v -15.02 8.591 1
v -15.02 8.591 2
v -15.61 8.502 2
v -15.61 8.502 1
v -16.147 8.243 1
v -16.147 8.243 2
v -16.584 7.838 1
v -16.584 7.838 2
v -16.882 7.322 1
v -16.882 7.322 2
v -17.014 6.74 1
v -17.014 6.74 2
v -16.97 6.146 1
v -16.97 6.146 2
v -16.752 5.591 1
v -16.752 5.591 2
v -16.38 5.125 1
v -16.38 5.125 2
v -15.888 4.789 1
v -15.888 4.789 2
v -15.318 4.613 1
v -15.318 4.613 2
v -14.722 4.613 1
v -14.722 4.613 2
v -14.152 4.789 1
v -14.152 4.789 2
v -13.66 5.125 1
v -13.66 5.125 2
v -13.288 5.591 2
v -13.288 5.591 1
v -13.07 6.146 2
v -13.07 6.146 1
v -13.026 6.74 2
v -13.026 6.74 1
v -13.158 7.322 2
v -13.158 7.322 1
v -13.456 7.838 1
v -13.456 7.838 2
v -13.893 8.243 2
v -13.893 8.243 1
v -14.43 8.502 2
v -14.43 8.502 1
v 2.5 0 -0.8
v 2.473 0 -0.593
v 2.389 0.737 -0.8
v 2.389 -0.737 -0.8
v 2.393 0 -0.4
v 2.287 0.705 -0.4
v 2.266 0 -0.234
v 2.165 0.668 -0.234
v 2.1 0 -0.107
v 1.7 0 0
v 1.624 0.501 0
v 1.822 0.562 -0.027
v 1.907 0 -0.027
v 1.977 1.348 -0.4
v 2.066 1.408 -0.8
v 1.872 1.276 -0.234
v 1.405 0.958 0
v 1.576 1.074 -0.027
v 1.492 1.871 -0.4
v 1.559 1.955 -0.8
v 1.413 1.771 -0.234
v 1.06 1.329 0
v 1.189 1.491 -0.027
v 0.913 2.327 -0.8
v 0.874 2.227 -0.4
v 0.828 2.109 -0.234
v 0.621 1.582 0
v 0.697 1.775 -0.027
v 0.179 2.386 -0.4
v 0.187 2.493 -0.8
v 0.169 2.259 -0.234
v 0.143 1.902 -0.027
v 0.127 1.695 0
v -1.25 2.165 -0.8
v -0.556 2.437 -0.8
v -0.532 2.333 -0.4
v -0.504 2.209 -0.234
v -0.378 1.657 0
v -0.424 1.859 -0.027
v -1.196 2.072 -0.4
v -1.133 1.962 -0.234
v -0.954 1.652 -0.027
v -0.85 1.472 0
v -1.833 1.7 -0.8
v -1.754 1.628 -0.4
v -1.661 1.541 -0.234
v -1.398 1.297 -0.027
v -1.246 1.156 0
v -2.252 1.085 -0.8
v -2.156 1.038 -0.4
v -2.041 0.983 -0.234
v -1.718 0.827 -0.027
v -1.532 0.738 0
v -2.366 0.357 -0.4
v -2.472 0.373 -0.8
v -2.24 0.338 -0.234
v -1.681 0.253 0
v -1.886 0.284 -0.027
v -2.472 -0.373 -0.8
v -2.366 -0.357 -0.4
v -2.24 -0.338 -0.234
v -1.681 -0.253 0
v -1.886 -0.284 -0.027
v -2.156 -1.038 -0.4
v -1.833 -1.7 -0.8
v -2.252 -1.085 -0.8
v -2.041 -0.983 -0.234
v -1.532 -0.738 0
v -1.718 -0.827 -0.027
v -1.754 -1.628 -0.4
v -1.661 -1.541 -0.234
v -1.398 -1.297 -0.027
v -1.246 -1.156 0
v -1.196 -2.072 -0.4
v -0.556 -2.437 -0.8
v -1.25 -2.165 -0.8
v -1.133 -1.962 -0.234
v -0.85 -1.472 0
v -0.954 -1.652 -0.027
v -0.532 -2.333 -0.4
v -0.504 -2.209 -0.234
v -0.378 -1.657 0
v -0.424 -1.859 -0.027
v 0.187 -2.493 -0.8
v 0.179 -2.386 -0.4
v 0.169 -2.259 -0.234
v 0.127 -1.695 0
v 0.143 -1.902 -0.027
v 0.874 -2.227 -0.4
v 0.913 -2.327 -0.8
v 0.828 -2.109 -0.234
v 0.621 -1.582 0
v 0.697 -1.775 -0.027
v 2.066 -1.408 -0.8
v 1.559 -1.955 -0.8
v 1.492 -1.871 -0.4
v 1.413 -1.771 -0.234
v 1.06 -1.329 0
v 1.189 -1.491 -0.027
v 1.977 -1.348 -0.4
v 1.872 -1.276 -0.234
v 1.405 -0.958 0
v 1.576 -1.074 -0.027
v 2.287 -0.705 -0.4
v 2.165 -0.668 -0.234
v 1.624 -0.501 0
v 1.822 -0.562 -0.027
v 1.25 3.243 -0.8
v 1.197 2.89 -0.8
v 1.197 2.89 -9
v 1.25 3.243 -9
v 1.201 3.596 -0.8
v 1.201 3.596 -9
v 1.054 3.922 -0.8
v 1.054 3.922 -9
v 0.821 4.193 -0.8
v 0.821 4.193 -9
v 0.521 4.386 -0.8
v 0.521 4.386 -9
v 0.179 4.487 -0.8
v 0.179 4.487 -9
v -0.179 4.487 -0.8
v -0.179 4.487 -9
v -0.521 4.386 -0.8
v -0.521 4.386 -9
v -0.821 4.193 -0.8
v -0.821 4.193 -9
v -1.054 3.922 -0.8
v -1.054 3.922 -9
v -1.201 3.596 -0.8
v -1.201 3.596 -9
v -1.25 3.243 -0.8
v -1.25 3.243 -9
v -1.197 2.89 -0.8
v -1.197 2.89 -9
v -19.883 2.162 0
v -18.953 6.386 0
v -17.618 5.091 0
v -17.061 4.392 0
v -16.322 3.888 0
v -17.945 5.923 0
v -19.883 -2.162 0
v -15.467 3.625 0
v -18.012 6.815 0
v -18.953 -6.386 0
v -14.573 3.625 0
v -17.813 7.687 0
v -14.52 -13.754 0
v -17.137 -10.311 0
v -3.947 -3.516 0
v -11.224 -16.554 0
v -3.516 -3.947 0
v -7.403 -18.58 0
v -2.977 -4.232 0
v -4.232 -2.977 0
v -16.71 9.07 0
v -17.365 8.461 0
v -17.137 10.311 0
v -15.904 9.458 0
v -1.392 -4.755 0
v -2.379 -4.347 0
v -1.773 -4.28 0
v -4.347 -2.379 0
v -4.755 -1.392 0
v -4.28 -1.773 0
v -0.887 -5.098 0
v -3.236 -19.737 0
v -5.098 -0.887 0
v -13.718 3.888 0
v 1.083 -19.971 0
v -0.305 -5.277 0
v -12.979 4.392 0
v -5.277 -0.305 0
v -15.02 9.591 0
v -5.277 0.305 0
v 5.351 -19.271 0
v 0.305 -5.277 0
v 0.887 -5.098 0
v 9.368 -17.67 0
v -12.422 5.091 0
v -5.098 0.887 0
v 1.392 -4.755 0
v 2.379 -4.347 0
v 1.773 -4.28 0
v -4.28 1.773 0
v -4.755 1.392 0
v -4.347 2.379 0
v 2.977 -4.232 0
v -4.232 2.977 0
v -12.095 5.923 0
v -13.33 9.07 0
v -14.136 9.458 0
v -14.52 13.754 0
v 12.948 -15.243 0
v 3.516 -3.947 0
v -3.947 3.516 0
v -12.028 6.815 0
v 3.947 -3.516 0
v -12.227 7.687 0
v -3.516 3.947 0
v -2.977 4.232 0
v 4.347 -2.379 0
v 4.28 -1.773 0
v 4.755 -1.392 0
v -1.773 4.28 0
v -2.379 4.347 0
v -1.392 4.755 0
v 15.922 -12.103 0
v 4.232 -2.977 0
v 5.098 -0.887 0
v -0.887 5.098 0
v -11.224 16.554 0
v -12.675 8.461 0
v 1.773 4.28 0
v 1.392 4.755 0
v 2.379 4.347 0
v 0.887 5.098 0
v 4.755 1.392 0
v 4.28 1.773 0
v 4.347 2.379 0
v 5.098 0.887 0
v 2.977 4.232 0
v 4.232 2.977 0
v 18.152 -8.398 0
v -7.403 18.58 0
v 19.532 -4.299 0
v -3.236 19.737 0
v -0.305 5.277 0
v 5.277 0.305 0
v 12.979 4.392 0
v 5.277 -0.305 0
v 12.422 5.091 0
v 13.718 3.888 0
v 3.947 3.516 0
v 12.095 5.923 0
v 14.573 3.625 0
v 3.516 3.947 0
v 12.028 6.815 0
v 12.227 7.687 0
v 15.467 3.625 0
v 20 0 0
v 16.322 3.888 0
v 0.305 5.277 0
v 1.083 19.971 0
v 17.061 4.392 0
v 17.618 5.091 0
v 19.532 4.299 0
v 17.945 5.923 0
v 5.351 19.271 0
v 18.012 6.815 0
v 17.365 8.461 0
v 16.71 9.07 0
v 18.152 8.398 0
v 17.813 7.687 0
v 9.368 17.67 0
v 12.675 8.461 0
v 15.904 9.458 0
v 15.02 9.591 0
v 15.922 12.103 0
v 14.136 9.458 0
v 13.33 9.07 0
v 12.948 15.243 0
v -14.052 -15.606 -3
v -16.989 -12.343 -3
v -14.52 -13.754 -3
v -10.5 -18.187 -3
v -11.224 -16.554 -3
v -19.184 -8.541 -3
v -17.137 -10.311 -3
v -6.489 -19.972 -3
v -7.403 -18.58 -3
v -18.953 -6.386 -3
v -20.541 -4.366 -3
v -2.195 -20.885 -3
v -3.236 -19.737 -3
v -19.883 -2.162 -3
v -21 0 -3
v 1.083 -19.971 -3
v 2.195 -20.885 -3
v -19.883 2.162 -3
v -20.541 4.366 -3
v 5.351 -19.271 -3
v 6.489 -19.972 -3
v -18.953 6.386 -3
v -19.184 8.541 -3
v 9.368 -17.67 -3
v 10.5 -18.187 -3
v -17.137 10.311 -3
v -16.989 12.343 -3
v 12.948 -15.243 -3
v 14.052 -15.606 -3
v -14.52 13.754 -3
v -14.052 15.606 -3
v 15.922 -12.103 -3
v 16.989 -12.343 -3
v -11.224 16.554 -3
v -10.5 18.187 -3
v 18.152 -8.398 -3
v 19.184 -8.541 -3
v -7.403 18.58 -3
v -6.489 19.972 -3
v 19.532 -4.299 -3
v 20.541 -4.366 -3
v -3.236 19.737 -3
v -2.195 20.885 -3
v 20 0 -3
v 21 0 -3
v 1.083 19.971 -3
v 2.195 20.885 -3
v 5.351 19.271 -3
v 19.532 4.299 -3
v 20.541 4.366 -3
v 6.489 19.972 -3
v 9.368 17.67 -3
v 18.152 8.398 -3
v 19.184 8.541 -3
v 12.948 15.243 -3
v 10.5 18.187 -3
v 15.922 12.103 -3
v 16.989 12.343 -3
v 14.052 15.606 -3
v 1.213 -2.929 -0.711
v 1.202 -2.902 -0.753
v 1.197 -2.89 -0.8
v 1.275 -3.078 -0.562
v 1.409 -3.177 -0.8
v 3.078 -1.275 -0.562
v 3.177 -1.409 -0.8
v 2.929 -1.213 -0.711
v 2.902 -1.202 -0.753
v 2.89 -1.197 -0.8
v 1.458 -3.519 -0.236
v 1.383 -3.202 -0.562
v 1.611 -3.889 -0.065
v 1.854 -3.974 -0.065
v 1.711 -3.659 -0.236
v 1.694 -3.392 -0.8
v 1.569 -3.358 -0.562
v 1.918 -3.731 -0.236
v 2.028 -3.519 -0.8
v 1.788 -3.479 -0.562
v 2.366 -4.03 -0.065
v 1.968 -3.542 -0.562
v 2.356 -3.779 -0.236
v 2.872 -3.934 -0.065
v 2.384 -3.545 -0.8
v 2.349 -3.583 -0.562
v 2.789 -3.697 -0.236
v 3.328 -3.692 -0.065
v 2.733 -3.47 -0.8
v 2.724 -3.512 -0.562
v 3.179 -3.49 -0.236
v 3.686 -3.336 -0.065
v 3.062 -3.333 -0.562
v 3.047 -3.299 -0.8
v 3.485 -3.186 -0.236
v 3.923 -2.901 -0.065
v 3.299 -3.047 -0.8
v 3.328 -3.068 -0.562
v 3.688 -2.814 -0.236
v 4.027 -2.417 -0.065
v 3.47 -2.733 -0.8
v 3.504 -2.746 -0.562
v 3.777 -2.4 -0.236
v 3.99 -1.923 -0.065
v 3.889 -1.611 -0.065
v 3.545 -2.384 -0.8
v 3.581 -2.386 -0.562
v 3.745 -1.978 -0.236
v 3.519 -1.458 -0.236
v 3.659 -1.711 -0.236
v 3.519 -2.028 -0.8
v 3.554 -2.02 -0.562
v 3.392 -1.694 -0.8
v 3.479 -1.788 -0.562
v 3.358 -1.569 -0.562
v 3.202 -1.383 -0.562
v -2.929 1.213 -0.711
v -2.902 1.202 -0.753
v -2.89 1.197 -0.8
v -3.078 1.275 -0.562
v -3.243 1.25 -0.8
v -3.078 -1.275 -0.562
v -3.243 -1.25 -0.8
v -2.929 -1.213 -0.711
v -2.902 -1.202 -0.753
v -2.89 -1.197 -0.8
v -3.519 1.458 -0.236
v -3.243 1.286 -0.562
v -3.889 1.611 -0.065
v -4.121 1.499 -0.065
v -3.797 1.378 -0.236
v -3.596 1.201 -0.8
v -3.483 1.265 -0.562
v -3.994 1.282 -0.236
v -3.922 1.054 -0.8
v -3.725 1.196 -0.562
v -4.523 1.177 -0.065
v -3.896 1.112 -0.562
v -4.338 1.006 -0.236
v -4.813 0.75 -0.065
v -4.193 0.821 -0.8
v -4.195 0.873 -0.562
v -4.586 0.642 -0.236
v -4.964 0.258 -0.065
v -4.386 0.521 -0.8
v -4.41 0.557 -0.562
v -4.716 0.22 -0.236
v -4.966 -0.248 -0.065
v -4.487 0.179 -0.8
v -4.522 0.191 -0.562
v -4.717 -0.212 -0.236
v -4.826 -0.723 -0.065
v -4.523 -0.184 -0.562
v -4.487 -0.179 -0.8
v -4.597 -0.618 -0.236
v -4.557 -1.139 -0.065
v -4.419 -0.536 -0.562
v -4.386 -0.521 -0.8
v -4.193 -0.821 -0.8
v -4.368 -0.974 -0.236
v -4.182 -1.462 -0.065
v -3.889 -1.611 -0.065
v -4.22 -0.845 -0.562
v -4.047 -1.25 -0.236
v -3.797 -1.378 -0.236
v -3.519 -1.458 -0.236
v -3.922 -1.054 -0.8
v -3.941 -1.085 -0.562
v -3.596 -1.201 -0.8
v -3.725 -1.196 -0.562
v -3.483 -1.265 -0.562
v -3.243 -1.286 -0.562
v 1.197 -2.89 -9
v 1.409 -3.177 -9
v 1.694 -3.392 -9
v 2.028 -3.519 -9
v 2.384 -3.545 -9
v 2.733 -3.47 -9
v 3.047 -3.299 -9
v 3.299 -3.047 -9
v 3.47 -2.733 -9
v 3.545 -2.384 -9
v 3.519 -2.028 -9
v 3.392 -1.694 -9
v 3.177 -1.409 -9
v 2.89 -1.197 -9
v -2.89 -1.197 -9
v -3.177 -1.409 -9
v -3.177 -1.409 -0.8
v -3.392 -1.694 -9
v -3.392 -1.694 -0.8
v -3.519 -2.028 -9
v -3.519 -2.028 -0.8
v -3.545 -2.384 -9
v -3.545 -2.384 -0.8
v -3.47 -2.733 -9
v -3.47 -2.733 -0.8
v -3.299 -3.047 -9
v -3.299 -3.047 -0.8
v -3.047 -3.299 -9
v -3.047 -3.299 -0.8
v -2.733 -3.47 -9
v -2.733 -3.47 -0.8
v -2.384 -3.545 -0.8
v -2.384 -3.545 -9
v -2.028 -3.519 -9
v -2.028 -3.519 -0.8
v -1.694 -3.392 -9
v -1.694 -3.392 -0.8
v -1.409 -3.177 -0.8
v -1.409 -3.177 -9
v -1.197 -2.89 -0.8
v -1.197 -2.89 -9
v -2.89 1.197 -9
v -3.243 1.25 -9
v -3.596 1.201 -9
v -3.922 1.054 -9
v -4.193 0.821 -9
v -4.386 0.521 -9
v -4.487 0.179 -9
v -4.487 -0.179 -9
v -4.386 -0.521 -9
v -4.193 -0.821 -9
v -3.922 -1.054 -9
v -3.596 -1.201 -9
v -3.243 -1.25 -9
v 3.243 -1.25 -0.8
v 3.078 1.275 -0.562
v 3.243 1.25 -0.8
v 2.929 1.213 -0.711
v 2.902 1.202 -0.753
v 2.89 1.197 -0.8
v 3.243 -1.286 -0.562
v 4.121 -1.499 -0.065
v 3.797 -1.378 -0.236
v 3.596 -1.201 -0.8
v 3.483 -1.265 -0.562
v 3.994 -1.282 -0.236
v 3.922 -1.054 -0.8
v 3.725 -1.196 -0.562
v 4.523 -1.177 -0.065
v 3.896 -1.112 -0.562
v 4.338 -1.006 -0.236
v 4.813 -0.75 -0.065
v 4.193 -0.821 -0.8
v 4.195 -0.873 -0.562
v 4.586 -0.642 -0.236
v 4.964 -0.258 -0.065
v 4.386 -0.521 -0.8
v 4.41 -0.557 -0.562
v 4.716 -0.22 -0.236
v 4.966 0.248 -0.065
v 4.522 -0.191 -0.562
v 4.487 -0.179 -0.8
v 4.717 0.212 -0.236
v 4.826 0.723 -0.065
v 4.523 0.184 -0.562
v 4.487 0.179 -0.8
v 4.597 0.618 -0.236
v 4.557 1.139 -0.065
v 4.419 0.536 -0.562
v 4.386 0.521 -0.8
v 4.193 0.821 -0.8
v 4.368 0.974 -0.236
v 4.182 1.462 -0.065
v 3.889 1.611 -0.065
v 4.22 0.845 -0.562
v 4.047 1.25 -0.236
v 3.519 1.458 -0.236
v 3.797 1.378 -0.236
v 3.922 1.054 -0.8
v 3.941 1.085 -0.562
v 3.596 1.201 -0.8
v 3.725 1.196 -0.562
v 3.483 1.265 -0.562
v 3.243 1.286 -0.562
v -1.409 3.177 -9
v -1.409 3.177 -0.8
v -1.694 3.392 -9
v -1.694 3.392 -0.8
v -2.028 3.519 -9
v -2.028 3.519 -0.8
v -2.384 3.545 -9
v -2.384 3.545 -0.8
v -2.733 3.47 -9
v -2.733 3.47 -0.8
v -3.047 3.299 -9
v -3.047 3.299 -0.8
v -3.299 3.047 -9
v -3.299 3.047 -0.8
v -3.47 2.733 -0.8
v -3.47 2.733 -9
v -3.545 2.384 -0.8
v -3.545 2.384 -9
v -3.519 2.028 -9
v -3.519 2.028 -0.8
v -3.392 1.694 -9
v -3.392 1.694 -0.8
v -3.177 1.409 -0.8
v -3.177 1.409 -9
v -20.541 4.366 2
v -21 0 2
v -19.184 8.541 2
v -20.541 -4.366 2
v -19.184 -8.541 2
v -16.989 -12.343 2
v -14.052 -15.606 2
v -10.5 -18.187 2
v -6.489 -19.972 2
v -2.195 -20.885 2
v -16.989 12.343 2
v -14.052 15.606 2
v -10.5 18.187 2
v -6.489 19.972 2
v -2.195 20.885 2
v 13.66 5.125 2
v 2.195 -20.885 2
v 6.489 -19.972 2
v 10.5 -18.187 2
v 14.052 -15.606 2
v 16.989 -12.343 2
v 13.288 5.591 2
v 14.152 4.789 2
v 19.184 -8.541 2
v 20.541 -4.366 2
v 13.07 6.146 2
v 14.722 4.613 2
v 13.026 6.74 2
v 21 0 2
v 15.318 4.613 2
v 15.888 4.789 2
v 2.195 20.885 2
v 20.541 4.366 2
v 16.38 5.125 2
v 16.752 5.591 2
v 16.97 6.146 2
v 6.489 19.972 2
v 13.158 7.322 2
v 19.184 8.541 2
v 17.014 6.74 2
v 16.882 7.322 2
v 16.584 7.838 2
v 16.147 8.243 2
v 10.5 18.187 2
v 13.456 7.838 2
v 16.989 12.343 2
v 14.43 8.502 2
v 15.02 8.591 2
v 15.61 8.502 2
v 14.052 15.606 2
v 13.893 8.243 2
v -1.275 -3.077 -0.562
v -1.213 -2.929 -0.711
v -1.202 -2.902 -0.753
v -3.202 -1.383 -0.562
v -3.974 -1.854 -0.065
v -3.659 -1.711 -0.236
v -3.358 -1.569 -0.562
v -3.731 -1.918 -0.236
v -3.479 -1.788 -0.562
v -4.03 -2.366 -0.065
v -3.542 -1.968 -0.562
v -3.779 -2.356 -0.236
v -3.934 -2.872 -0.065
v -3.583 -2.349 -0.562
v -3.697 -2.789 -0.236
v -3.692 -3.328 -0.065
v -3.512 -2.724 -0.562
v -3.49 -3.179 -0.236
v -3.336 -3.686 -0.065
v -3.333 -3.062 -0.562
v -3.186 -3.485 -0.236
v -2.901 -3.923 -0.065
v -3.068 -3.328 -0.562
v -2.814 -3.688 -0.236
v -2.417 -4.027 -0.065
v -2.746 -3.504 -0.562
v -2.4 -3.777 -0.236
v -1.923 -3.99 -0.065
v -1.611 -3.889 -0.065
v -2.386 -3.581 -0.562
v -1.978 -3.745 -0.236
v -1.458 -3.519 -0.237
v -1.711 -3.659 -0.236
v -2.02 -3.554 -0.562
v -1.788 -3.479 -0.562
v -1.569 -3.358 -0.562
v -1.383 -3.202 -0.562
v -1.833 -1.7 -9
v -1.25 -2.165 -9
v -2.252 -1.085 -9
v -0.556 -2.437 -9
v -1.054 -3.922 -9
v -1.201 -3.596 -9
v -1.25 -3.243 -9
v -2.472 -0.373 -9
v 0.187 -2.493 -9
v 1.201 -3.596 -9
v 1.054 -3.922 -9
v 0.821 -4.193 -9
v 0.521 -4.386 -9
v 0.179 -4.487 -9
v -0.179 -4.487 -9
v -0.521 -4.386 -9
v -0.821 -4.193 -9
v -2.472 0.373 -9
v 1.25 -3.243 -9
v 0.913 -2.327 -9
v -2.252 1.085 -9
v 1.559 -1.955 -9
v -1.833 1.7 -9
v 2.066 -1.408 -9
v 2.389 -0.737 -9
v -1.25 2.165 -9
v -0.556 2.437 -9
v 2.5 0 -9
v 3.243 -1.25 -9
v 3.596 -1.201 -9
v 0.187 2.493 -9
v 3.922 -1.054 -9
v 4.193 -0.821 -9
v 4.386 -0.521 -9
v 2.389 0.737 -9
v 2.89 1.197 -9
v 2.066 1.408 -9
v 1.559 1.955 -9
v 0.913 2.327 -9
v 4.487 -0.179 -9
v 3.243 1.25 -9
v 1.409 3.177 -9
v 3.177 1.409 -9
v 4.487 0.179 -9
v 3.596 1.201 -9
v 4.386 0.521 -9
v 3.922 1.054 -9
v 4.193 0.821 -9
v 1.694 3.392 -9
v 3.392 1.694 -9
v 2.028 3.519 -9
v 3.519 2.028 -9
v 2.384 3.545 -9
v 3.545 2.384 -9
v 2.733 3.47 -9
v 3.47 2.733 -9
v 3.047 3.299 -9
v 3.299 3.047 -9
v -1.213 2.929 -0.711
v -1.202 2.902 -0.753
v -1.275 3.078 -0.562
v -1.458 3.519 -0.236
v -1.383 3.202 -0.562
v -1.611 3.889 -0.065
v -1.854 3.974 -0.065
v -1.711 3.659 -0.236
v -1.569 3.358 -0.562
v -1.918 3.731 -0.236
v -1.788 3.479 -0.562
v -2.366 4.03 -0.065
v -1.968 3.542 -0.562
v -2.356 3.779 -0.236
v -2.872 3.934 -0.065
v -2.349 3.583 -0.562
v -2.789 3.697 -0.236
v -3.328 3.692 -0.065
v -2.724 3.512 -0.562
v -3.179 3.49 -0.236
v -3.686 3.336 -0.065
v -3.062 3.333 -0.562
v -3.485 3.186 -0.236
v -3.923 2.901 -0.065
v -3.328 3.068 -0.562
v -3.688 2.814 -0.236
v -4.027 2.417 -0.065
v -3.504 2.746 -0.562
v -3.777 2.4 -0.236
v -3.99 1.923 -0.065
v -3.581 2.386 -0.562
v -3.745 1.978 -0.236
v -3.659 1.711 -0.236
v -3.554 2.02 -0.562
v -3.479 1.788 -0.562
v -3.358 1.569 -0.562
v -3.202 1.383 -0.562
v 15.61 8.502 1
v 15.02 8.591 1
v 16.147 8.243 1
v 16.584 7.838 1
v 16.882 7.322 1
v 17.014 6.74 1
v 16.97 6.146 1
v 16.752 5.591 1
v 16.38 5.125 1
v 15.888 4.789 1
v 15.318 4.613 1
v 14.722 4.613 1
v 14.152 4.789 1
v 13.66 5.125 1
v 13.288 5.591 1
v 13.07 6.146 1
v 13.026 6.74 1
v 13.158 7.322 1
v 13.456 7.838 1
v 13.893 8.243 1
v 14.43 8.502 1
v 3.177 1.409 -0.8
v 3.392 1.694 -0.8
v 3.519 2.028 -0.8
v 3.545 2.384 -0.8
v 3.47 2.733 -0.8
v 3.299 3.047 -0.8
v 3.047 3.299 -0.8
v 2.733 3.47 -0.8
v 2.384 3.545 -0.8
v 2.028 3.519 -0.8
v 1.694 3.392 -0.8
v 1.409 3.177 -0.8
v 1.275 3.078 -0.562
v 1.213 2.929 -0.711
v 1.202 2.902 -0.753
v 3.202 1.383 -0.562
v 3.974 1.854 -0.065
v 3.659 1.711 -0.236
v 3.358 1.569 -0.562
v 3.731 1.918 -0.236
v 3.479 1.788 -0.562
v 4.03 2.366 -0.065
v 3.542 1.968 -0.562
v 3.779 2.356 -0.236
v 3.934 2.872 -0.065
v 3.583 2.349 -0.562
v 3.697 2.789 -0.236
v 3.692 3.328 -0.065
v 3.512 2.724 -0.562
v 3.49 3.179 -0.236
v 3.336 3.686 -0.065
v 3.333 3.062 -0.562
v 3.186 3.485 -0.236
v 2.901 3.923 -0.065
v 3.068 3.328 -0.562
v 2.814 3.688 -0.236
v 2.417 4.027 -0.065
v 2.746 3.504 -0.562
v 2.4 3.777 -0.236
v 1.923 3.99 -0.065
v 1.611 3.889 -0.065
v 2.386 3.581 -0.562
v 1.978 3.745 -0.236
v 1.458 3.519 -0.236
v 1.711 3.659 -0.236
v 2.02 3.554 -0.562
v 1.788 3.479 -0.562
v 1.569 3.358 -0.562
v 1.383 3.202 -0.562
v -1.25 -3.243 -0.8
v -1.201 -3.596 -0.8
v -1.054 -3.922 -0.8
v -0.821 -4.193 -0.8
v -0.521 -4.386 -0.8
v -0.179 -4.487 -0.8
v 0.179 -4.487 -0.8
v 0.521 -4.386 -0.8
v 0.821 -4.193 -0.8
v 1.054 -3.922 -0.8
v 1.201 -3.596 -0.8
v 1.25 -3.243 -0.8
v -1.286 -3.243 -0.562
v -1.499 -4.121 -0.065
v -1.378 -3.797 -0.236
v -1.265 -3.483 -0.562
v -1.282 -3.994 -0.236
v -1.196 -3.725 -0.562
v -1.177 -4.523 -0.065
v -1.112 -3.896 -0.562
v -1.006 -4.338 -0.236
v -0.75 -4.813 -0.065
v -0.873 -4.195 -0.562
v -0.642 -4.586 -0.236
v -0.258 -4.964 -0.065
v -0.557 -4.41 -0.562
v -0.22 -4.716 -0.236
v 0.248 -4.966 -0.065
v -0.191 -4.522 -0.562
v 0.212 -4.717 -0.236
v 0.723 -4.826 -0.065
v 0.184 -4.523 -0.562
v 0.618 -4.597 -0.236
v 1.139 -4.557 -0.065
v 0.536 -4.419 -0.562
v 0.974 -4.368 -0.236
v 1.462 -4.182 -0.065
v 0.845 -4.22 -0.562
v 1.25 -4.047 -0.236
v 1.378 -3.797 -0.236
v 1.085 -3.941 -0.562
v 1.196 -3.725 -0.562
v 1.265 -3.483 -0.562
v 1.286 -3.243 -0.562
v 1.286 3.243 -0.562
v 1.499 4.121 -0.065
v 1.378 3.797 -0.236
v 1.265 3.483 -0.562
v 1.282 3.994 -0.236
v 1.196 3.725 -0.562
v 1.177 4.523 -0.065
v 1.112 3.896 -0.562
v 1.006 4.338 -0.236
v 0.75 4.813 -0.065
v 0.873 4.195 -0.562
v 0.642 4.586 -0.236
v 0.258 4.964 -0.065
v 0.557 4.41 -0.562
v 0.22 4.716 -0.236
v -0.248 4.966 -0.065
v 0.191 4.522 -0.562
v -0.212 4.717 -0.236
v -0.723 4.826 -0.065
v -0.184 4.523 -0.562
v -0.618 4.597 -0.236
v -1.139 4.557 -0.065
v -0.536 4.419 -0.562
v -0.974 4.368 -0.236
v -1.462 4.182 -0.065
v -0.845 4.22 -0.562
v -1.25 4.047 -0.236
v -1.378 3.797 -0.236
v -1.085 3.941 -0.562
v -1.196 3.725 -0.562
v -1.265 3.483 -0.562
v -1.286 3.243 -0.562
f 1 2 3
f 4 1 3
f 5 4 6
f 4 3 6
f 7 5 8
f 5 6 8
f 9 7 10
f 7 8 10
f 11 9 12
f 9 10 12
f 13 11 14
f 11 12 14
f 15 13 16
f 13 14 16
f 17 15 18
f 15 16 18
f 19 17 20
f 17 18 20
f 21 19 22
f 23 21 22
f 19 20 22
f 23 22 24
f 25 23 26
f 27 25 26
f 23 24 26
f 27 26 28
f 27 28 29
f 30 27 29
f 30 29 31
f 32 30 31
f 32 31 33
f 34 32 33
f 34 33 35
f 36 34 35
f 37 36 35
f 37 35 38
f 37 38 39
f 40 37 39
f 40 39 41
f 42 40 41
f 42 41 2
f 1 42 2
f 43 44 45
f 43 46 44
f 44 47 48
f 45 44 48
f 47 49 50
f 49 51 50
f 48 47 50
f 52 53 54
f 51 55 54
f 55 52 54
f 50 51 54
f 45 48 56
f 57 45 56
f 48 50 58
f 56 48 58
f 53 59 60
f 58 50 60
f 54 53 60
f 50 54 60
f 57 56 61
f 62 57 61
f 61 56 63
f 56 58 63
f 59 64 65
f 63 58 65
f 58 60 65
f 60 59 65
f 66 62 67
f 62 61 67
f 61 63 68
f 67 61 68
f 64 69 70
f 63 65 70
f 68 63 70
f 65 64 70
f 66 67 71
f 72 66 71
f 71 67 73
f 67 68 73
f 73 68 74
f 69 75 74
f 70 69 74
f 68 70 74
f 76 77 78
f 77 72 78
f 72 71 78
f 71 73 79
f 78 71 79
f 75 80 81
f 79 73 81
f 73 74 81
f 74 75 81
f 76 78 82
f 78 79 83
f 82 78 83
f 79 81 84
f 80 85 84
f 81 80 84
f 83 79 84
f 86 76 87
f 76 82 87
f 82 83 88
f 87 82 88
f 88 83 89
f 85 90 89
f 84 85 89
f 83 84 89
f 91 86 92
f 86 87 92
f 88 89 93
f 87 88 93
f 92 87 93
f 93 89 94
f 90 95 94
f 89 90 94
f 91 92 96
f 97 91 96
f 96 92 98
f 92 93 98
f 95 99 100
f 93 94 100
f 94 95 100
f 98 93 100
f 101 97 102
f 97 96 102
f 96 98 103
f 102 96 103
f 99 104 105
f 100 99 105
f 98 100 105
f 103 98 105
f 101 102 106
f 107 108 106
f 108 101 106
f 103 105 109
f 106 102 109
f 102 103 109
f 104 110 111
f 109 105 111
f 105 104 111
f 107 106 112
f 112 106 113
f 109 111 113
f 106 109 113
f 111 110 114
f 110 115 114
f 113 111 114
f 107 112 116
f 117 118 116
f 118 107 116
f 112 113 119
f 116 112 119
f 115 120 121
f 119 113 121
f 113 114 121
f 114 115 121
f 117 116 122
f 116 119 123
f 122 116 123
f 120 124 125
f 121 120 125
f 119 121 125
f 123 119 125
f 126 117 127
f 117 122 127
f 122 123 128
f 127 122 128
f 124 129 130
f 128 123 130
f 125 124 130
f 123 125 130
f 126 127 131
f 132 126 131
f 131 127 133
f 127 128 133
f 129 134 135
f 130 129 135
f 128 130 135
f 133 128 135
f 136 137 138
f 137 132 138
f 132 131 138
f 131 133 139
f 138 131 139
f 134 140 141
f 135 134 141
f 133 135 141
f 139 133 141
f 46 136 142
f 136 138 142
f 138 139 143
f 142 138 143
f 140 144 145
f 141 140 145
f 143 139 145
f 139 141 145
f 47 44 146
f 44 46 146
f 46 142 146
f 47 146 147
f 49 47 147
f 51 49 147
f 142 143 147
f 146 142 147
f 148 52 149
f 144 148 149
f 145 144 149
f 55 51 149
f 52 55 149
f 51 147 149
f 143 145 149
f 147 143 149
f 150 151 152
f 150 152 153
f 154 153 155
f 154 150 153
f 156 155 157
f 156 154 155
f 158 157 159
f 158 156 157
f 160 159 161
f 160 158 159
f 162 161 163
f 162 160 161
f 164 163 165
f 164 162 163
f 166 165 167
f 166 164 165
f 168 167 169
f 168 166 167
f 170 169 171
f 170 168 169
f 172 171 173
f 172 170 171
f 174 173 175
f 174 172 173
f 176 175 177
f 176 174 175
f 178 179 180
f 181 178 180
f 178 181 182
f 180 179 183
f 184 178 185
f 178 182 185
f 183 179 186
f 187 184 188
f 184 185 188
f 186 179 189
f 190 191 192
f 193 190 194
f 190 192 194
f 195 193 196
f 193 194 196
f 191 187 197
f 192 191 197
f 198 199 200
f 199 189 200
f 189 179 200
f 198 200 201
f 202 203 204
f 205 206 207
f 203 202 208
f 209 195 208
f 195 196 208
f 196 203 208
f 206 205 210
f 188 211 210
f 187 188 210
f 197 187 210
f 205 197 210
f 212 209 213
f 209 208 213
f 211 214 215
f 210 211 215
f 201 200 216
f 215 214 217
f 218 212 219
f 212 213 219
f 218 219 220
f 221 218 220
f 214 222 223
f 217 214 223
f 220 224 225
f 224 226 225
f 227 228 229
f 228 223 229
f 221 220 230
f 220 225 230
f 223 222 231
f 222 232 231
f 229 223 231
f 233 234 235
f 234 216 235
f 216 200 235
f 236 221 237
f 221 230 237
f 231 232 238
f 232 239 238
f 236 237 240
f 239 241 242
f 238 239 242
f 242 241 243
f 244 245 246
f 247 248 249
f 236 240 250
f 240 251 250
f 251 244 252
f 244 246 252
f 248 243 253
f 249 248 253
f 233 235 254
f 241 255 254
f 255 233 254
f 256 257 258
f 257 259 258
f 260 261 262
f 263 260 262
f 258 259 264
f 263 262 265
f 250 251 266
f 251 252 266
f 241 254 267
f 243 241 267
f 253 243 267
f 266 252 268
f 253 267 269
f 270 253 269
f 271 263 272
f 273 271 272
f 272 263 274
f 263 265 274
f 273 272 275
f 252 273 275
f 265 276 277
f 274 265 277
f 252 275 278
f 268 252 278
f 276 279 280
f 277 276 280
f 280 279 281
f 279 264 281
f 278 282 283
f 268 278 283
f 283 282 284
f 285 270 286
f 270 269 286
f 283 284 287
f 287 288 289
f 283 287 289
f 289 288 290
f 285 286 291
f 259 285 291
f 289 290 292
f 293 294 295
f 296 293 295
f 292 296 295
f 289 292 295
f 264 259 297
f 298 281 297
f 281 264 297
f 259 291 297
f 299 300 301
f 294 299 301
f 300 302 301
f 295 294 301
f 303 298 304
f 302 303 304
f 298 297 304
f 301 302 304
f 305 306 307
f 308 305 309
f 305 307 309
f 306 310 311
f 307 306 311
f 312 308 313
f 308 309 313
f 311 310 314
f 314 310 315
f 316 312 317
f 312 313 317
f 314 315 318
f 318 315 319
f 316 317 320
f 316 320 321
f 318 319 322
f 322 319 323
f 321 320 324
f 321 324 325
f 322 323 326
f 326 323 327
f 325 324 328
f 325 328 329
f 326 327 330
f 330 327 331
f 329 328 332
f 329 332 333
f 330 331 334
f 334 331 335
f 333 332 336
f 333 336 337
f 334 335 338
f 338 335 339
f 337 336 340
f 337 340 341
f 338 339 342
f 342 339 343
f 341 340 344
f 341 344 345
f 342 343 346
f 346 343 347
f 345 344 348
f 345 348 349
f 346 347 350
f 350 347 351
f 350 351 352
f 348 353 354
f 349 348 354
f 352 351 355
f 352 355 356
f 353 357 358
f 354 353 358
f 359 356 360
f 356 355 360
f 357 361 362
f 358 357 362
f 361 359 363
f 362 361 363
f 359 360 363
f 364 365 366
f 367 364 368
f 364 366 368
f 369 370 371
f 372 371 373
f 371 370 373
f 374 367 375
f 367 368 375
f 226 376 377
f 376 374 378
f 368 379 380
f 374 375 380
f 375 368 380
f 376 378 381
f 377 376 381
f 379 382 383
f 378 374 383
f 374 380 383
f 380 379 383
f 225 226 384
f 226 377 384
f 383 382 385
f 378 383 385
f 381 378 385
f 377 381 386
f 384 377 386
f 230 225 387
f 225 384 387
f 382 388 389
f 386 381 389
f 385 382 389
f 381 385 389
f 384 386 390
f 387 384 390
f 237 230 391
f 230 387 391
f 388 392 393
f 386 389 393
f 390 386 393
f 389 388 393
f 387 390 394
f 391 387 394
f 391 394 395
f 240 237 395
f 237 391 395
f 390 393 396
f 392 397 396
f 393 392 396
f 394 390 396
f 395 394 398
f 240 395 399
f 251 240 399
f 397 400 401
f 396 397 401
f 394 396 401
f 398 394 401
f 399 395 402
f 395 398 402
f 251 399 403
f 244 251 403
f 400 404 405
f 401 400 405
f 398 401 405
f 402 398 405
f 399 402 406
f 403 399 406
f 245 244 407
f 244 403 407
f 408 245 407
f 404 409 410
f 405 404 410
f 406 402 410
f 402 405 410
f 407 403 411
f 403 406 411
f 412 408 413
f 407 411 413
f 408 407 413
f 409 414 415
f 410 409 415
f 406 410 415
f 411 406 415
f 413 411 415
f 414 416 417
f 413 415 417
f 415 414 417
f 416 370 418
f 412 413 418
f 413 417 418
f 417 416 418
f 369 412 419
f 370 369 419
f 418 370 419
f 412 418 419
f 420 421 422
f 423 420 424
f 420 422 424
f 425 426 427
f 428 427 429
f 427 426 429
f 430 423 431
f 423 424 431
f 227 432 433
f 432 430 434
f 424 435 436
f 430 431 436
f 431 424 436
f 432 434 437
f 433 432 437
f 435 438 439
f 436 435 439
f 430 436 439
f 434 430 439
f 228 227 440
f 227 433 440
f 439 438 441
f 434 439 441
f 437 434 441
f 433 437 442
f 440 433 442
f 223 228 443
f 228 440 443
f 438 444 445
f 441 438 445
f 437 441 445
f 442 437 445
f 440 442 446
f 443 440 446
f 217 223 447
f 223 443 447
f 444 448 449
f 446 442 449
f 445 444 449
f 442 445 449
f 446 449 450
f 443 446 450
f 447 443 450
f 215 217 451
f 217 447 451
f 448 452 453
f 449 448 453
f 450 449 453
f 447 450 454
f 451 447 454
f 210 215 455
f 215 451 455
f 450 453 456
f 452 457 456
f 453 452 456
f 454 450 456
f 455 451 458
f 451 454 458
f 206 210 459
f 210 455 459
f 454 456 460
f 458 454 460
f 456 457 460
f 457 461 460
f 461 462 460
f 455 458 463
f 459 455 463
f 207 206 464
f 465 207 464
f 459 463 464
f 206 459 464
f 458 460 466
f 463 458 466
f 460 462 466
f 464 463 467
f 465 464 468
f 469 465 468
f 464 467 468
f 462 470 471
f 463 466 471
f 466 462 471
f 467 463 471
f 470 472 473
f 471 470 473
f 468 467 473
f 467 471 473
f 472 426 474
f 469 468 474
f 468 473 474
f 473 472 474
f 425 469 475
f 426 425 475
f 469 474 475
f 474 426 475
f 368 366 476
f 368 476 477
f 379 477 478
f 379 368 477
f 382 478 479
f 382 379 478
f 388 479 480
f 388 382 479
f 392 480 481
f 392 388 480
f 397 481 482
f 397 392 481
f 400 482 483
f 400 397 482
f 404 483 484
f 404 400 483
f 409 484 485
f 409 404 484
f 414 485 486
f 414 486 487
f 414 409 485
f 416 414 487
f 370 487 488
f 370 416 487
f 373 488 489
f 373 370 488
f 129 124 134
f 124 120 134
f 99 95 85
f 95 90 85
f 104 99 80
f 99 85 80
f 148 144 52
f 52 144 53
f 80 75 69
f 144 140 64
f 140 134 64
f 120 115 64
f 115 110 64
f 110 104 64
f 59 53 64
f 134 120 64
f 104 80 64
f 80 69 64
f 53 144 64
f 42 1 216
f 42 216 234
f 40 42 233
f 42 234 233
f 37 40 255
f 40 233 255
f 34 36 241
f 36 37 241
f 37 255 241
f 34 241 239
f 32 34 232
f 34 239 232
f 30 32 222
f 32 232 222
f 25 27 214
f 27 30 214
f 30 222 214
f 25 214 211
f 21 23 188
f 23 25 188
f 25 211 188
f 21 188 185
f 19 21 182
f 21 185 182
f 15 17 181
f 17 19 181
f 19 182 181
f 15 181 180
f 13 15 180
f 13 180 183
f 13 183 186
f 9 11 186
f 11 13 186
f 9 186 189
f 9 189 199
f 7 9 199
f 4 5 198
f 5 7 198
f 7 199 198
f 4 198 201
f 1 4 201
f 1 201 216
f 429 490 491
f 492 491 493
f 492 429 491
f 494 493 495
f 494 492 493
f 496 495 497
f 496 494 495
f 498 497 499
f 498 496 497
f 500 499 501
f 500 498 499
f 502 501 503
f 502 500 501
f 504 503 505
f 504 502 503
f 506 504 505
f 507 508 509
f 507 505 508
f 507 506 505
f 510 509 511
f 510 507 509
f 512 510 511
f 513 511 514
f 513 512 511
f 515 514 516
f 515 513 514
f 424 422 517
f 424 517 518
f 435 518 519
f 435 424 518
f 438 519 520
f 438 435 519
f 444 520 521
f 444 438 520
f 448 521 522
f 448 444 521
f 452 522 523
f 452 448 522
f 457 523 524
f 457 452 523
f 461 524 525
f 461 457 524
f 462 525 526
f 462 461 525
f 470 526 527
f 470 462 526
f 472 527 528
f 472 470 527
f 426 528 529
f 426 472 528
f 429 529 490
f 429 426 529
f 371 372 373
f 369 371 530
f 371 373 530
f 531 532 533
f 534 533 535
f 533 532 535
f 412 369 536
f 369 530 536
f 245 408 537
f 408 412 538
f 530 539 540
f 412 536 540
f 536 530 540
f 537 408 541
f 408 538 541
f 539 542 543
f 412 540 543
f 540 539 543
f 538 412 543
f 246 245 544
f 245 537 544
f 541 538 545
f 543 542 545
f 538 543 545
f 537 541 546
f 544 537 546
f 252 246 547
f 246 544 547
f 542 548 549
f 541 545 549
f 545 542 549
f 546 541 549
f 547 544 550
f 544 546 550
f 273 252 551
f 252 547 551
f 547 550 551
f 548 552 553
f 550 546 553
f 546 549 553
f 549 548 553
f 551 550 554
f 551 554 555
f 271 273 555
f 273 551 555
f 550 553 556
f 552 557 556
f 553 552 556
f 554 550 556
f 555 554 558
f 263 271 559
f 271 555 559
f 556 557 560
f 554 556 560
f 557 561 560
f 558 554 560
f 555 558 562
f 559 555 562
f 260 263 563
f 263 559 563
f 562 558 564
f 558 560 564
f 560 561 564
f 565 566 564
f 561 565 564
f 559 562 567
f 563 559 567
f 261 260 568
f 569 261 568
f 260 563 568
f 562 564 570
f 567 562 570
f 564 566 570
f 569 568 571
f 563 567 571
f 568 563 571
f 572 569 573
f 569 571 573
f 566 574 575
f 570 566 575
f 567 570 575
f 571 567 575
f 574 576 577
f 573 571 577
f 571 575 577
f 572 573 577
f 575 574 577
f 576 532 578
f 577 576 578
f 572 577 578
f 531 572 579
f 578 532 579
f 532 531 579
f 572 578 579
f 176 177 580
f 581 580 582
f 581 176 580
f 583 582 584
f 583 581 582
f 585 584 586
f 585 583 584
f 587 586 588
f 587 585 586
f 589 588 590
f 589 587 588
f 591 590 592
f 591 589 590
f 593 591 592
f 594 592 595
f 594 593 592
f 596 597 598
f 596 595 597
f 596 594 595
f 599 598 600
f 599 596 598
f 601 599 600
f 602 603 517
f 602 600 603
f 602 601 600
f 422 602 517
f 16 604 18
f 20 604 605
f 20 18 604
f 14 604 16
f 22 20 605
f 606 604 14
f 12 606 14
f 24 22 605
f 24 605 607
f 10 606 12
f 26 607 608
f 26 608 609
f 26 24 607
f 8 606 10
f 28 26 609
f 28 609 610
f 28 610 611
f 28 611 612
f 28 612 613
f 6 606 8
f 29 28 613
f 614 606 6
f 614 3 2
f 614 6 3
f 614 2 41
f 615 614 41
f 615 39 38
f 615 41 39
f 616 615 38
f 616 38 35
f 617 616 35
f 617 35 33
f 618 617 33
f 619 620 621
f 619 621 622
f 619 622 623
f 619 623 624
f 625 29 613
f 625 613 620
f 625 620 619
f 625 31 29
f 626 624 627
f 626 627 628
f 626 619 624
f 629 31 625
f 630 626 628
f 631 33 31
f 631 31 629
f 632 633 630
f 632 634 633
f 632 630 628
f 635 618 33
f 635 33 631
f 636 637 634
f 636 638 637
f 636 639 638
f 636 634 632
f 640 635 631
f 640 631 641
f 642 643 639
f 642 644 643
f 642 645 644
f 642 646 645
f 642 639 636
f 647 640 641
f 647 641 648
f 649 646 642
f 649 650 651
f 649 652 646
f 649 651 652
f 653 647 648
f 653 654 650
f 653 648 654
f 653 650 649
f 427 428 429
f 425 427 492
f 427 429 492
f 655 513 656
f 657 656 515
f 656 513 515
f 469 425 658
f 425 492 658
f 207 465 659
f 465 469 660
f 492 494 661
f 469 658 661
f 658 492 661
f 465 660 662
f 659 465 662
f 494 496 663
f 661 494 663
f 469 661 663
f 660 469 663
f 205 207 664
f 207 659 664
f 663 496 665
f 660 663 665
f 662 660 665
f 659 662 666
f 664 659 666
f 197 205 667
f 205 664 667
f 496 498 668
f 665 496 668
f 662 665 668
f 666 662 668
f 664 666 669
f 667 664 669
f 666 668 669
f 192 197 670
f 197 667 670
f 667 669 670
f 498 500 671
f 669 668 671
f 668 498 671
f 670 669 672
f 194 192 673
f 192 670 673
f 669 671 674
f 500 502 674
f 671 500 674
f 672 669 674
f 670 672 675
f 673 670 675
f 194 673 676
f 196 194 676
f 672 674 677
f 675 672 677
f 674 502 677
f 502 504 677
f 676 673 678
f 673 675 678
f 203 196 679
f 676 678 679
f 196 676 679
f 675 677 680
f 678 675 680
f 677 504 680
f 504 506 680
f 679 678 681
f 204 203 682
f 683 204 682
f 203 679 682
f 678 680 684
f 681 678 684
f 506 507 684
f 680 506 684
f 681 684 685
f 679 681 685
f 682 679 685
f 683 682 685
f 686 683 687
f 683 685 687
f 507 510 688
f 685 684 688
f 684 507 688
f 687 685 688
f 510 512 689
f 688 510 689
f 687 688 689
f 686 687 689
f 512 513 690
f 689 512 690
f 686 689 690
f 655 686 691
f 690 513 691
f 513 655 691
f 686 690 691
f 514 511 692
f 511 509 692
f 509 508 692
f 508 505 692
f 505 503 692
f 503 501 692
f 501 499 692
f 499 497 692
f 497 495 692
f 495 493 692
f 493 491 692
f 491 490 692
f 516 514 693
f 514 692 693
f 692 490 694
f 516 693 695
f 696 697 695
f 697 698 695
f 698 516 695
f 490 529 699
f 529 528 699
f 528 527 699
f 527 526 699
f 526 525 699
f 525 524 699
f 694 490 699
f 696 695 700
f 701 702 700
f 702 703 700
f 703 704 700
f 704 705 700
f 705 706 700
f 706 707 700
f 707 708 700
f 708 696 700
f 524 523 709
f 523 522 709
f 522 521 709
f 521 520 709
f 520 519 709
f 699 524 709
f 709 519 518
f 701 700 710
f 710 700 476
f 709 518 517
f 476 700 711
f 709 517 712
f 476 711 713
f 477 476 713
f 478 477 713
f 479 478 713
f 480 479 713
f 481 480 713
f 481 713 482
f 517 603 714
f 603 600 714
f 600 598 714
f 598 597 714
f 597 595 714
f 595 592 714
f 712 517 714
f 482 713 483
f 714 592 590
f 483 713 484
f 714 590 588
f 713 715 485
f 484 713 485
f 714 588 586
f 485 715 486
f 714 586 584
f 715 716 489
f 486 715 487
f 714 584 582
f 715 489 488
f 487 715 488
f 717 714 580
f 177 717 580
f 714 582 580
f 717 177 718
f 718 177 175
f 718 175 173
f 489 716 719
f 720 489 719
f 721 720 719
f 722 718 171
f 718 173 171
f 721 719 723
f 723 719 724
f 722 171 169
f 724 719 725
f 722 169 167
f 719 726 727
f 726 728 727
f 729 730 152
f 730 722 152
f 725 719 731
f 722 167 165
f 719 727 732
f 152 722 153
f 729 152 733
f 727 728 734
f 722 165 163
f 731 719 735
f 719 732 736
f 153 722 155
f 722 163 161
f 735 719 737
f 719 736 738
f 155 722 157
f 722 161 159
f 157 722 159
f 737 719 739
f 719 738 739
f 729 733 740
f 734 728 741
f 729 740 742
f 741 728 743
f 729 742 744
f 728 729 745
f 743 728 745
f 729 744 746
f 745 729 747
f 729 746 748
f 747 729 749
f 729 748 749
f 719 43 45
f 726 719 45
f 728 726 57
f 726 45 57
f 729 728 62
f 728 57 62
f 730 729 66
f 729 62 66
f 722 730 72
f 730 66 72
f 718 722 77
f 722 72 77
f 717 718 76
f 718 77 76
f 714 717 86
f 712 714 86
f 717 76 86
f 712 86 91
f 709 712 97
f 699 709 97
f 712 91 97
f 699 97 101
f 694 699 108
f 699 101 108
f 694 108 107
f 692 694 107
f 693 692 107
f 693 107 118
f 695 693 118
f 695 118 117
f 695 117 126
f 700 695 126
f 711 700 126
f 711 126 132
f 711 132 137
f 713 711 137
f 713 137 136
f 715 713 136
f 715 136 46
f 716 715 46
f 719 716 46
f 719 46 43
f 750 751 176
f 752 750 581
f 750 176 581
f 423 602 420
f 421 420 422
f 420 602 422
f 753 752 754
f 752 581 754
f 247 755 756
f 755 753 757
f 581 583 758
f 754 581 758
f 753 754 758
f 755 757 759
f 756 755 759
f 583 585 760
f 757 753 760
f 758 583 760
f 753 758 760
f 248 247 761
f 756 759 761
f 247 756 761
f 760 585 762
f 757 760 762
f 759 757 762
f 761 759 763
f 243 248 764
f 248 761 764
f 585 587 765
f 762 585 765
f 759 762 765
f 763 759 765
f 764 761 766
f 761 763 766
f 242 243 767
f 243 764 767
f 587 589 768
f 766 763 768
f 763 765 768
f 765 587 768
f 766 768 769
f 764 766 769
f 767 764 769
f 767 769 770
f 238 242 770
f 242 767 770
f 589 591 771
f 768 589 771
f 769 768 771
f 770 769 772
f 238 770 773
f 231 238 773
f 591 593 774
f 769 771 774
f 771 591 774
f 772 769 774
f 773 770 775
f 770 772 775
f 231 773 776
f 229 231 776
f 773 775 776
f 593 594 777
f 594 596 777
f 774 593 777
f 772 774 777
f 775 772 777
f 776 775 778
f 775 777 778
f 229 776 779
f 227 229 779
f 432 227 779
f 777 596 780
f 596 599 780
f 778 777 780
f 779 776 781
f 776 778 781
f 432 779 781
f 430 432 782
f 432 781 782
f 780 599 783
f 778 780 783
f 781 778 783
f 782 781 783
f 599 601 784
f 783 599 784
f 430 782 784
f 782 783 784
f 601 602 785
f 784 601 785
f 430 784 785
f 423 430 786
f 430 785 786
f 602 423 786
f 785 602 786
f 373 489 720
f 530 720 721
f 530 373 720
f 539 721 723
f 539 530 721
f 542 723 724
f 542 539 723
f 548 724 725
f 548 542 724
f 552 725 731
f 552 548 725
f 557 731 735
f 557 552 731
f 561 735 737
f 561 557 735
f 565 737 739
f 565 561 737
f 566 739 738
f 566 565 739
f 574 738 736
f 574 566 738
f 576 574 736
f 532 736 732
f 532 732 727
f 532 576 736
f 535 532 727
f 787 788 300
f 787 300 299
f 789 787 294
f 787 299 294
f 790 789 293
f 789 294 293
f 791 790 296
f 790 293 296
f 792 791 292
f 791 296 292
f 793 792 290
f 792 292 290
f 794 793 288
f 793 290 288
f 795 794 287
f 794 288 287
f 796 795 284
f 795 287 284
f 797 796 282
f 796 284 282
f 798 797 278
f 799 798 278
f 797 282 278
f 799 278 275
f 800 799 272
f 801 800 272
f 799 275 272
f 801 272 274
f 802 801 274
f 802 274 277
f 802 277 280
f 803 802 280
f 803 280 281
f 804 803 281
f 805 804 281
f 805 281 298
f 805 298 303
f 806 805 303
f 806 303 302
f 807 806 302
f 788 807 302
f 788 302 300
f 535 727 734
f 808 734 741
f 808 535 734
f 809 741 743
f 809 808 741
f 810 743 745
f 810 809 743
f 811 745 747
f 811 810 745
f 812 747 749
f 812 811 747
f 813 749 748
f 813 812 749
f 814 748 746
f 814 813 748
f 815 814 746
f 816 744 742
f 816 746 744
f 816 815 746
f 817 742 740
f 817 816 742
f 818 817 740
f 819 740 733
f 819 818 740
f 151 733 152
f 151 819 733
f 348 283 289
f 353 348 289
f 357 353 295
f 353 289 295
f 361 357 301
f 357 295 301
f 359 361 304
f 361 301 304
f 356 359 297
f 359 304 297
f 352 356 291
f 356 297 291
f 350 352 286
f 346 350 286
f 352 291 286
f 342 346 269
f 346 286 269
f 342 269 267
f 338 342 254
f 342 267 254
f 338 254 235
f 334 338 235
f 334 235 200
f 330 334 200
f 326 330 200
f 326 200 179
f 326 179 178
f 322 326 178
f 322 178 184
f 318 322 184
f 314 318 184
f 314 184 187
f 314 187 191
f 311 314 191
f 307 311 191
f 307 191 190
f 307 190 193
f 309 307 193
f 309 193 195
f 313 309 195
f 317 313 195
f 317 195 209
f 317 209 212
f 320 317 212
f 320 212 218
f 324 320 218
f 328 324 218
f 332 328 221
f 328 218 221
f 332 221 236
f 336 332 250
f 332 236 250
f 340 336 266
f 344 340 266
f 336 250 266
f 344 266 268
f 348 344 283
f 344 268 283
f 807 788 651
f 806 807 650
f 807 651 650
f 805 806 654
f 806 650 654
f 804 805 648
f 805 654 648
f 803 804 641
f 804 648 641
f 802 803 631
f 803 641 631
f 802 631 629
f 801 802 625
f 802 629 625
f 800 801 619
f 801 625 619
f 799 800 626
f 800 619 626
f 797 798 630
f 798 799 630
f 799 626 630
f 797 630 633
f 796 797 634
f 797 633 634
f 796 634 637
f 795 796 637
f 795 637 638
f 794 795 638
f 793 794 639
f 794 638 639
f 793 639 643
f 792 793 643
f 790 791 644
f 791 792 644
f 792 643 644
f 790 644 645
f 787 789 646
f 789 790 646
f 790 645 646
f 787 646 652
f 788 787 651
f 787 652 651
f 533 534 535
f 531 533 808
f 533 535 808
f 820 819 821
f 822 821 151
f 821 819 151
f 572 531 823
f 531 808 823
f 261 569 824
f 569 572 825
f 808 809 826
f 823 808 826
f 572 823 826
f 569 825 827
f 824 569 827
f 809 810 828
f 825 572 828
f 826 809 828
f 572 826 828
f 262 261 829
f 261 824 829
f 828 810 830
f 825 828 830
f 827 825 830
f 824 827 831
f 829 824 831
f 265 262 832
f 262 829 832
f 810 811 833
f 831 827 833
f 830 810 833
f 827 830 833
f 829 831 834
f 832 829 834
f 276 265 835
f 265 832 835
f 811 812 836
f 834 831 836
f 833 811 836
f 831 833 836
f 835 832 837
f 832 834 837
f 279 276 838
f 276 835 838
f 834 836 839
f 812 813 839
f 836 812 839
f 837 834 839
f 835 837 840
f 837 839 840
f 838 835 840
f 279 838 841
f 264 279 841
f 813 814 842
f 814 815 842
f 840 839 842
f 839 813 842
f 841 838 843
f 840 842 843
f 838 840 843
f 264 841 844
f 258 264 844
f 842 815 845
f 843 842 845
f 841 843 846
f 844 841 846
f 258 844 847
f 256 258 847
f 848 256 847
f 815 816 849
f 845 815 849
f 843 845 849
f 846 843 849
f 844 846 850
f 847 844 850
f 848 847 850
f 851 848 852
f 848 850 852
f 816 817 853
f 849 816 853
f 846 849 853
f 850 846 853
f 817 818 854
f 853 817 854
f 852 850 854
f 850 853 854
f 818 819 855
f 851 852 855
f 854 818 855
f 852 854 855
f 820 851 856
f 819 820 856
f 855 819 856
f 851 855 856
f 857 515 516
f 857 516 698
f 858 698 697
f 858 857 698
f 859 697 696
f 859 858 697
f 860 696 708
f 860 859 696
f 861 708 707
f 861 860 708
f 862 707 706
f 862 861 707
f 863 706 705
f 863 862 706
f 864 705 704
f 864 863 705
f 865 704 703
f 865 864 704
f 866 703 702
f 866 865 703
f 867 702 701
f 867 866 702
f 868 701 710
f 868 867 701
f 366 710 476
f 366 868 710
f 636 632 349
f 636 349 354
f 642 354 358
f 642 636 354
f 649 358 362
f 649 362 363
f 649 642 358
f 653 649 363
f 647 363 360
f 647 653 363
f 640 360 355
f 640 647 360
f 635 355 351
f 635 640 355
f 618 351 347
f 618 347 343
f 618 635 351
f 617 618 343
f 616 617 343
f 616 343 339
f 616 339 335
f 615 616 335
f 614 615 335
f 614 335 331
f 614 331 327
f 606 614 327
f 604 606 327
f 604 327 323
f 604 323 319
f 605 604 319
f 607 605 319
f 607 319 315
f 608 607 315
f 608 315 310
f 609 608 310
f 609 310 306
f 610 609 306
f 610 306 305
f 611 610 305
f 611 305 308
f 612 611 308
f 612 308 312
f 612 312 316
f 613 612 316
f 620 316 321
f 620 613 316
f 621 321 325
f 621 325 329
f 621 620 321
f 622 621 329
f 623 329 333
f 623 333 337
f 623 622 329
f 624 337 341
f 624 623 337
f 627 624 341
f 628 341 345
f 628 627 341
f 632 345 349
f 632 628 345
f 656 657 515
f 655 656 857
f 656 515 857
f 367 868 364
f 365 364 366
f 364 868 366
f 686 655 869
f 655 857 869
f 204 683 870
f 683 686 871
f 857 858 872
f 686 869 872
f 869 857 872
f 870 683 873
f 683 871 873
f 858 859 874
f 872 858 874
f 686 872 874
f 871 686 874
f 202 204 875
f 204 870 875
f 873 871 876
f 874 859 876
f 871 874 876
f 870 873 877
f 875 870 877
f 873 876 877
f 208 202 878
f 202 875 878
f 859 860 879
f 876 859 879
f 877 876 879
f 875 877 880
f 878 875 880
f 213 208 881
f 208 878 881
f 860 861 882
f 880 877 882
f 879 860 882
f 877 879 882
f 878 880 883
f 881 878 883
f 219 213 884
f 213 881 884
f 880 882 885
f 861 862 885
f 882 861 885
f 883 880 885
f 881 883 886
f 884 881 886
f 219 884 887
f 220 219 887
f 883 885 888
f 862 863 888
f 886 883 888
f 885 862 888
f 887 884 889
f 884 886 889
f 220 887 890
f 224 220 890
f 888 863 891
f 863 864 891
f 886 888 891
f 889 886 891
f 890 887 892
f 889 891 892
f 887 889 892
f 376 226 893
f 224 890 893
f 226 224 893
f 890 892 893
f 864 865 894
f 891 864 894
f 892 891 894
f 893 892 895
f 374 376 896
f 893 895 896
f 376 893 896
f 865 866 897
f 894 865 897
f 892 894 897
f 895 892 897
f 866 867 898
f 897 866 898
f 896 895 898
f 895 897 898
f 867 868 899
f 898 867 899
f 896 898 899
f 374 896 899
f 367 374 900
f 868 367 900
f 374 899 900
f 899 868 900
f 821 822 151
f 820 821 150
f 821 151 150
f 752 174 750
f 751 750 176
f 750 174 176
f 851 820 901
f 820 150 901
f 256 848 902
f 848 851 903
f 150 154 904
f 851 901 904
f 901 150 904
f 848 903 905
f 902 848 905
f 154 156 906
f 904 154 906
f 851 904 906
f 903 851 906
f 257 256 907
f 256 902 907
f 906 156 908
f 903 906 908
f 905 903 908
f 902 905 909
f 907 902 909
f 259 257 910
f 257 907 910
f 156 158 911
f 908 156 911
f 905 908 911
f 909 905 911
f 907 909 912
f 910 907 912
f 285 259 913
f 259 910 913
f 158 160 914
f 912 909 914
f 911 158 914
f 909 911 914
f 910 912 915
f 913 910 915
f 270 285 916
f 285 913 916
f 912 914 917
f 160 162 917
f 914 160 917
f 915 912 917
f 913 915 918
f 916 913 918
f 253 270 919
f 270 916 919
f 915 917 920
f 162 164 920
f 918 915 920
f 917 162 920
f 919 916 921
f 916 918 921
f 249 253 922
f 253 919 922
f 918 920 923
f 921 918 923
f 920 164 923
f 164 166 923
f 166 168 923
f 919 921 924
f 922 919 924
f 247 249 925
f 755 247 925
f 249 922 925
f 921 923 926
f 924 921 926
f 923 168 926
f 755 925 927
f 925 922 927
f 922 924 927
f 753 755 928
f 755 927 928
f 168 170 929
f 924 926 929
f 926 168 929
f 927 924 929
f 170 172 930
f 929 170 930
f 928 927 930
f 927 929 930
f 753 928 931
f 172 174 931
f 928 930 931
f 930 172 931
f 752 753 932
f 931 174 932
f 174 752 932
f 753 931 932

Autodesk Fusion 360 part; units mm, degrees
sketch "Sketch1" plane through (0, 0, 0) normal (0, 0, 1) x (1, 0, 0) in component "BlindSupport"
  circle A0 centre (0, 0) radius 20
  circle A1 centre (0, 0) radius 21
  circle A2 centre (0, 0) radius 2.5
  circle A3 centre (0, 0) radius 4.5
  line L0 (0, 0) -> (0, 4.5)
  line L1 (0, 0) -> (-3.182, 3.182)
  line L2 (0, 0) -> (-4.5, 0)
  line L3 (0, 0) -> (-3.182, -3.182)
  line L4 (0, 0) -> (0, -4.5)
  line L5 (0, 0) -> (3.182, -3.182)
  line L6 (0, 0) -> (4.5, 0)
  line L7 (0, 0) -> (3.182, 3.182)
  line L8 (0, 0) -> (0, 40.0695) construction
  circle A4 centre (-15, 6.5991) radius 2
  circle A5 centre (15, 6.5991) radius 2
  line L9 (15, 6.5991) -> (-15, 6.5991) construction
  line L10 (-19.5984, 22.5991) -> (25.099, 22.5991) construction
  circle A6 centre (0, 3.25) radius 1.25
  circle A7 centre (-2.2981, 2.2981) radius 1.25
  circle A8 centre (-3.25, 0) radius 1.25
  circle A9 centre (-2.2981, -2.2981) radius 1.25
  circle A10 centre (0, -3.25) radius 1.25
  circle A11 centre (2.2981, -2.2981) radius 1.25
  circle A12 centre (3.25, 0) radius 1.25
  circle A13 centre (2.2981, 2.2981) radius 1.25
  point P0 (0, 6.5991)
  point P1 (-15, 6.5991)
  dimension "d1" = 40
  dimension "d2" = 1
  dimension "d3" = 5
  dimension "d4" = 9
  dimension "d6" = 360
  dimension "d7" = 4
  dimension "d8" = 30
  dimension "d9" = 16
  dimension "d12" = 2.5
  dimension "d14" = 360
extrude "Extrude1" add sketch "Sketch1" along normal blind 2 contours A0 | A1 | A2 L6 A12 | A2 L6 A11 A12 | A2 L6 A12 A13 | A2 L6 A12 | A2 L6 L7 A12 A13 | A2 A12 A13 | A2 A11 A12 | A2 L5 L6 A11 A12 | A3 A12 A13 | A3 A11 A12 | A2 L7 A13 | A2 L7 A12 A13 | A12 A13 | A2 L5 A11 A12 | A2 L5 A11 | A11 A12 | A3 A6 A13 | A2 L7 A6 A13 | A2 L5 A10 A11 | A3 A10 A11 | A2 L0 L1 A6 A7 | A2 L1 L2 A7 A8 | A2 L2 L3 A8 A9 | A2 L3 L4 A9 A10 | A2 L4 L5 A10 A11 | A2 L0 L7 A6 A13 | A2 L7 A13 | A2 L5 A11 | A3 A6 A7 | A2 L0 A6 A13 | A2 L0 A6 A7 | A6 A13 | A2 L4 A9 A10 | A2 L4 A10 A11 | A3 A9 A10 | A10 A11 | A2 L0 A6 | A2 L0 A6 | A2 L1 A7 | A2 L1 A7 | A2 L2 A8 | A2 L2 A8 | A2 L3 A9 | A2 L3 A9 | A2 L4 A10 | A2 L4 A10 | A2 A6 A13 | A2 A10 A11 | A3 A7 A8 | A2 L1 A6 A7 | A2 L1 A7 A8 | A6 A7 | A2 L3 A8 A9 | A3 A8 A9 | A2 L3 A9 A10 | A9 A10 | A2 A6 A7 | A2 A7 A8 | A2 L2 A7 A8 | A2 L2 A8 A9 | A2 A8 A9 | A2 A9 A10 | A7 A8 | A8 A9 | A4 | A5 in component "BlindSupport"
extrude "Extrude2" add sketch "Sketch1" against normal blind 9 contours A2 L6 A11 A12 | A2 L6 A12 A13 | A2 A12 A13 | A2 A11 A12 | A2 L7 A12 A13 | A12 A13 | A2 L5 A11 A12 | A11 A12 | A2 L7 A6 A13 | A2 L5 A10 A11 | A2 L0 A6 A13 | A2 L0 A6 A7 | A6 A13 | A2 L4 A9 A10 | A2 L4 A10 A11 | A10 A11 | A2 A6 A13 | A2 A10 A11 | A2 L1 A6 A7 | A2 L1 A7 A8 | A6 A7 | A2 L3 A8 A9 | A2 L3 A9 A10 | A9 A10 | A2 A6 A7 | A2 A7 A8 | A2 L2 A7 A8 | A2 L2 A8 A9 | A2 A8 A9 | A2 A9 A10 | A7 A8 | A8 A9 in component "BlindSupport"
extrude "Extrude3" add sketch "Sketch1" against normal blind 3 contours A1 in component "BlindSupport"
sketch "Sketch2" plane through (0, 0, 2) normal (0, 0, 1) x (-1, 0, 0) in component "BlindSupport"
  circle A0 centre (0, 0) radius 21
  point P0 (-15, -6.5991)
  point P1 (15, -6.5991)
hole "Hole1" at (-15.02, 6.591, 0) direction (0, 0, 1) diameter 4 depth 4.5 tip angle 118 countersink diameter 6 countersink angle 90 in component "BlindSupport"
mirror "Mirror1" about plane through (0, 0, 0) normal (1, 0, 0) of "Hole1" in component "BlindSupport"
fillet "Fillet1" radius 0.8 8 edges at (0, -4.5, 0) (3.182, -3.182, 0) (4.5, 0, 0) (3.182, 3.182, 0) (0, 4.5, 0) (-3.182, 3.182, 0) (-4.5, 0, 0) (-3.182, -3.182, 0) in component "BlindSupport"
fillet "Fillet2" radius 0.8 1 edges at (-2.3308, 0.904, 0) in component "BlindSupport"
component "BlindSupport" placed x (1, 0, 0) y (0, 1, 0) z (0, 0, 1) at (0, 0, 0)
